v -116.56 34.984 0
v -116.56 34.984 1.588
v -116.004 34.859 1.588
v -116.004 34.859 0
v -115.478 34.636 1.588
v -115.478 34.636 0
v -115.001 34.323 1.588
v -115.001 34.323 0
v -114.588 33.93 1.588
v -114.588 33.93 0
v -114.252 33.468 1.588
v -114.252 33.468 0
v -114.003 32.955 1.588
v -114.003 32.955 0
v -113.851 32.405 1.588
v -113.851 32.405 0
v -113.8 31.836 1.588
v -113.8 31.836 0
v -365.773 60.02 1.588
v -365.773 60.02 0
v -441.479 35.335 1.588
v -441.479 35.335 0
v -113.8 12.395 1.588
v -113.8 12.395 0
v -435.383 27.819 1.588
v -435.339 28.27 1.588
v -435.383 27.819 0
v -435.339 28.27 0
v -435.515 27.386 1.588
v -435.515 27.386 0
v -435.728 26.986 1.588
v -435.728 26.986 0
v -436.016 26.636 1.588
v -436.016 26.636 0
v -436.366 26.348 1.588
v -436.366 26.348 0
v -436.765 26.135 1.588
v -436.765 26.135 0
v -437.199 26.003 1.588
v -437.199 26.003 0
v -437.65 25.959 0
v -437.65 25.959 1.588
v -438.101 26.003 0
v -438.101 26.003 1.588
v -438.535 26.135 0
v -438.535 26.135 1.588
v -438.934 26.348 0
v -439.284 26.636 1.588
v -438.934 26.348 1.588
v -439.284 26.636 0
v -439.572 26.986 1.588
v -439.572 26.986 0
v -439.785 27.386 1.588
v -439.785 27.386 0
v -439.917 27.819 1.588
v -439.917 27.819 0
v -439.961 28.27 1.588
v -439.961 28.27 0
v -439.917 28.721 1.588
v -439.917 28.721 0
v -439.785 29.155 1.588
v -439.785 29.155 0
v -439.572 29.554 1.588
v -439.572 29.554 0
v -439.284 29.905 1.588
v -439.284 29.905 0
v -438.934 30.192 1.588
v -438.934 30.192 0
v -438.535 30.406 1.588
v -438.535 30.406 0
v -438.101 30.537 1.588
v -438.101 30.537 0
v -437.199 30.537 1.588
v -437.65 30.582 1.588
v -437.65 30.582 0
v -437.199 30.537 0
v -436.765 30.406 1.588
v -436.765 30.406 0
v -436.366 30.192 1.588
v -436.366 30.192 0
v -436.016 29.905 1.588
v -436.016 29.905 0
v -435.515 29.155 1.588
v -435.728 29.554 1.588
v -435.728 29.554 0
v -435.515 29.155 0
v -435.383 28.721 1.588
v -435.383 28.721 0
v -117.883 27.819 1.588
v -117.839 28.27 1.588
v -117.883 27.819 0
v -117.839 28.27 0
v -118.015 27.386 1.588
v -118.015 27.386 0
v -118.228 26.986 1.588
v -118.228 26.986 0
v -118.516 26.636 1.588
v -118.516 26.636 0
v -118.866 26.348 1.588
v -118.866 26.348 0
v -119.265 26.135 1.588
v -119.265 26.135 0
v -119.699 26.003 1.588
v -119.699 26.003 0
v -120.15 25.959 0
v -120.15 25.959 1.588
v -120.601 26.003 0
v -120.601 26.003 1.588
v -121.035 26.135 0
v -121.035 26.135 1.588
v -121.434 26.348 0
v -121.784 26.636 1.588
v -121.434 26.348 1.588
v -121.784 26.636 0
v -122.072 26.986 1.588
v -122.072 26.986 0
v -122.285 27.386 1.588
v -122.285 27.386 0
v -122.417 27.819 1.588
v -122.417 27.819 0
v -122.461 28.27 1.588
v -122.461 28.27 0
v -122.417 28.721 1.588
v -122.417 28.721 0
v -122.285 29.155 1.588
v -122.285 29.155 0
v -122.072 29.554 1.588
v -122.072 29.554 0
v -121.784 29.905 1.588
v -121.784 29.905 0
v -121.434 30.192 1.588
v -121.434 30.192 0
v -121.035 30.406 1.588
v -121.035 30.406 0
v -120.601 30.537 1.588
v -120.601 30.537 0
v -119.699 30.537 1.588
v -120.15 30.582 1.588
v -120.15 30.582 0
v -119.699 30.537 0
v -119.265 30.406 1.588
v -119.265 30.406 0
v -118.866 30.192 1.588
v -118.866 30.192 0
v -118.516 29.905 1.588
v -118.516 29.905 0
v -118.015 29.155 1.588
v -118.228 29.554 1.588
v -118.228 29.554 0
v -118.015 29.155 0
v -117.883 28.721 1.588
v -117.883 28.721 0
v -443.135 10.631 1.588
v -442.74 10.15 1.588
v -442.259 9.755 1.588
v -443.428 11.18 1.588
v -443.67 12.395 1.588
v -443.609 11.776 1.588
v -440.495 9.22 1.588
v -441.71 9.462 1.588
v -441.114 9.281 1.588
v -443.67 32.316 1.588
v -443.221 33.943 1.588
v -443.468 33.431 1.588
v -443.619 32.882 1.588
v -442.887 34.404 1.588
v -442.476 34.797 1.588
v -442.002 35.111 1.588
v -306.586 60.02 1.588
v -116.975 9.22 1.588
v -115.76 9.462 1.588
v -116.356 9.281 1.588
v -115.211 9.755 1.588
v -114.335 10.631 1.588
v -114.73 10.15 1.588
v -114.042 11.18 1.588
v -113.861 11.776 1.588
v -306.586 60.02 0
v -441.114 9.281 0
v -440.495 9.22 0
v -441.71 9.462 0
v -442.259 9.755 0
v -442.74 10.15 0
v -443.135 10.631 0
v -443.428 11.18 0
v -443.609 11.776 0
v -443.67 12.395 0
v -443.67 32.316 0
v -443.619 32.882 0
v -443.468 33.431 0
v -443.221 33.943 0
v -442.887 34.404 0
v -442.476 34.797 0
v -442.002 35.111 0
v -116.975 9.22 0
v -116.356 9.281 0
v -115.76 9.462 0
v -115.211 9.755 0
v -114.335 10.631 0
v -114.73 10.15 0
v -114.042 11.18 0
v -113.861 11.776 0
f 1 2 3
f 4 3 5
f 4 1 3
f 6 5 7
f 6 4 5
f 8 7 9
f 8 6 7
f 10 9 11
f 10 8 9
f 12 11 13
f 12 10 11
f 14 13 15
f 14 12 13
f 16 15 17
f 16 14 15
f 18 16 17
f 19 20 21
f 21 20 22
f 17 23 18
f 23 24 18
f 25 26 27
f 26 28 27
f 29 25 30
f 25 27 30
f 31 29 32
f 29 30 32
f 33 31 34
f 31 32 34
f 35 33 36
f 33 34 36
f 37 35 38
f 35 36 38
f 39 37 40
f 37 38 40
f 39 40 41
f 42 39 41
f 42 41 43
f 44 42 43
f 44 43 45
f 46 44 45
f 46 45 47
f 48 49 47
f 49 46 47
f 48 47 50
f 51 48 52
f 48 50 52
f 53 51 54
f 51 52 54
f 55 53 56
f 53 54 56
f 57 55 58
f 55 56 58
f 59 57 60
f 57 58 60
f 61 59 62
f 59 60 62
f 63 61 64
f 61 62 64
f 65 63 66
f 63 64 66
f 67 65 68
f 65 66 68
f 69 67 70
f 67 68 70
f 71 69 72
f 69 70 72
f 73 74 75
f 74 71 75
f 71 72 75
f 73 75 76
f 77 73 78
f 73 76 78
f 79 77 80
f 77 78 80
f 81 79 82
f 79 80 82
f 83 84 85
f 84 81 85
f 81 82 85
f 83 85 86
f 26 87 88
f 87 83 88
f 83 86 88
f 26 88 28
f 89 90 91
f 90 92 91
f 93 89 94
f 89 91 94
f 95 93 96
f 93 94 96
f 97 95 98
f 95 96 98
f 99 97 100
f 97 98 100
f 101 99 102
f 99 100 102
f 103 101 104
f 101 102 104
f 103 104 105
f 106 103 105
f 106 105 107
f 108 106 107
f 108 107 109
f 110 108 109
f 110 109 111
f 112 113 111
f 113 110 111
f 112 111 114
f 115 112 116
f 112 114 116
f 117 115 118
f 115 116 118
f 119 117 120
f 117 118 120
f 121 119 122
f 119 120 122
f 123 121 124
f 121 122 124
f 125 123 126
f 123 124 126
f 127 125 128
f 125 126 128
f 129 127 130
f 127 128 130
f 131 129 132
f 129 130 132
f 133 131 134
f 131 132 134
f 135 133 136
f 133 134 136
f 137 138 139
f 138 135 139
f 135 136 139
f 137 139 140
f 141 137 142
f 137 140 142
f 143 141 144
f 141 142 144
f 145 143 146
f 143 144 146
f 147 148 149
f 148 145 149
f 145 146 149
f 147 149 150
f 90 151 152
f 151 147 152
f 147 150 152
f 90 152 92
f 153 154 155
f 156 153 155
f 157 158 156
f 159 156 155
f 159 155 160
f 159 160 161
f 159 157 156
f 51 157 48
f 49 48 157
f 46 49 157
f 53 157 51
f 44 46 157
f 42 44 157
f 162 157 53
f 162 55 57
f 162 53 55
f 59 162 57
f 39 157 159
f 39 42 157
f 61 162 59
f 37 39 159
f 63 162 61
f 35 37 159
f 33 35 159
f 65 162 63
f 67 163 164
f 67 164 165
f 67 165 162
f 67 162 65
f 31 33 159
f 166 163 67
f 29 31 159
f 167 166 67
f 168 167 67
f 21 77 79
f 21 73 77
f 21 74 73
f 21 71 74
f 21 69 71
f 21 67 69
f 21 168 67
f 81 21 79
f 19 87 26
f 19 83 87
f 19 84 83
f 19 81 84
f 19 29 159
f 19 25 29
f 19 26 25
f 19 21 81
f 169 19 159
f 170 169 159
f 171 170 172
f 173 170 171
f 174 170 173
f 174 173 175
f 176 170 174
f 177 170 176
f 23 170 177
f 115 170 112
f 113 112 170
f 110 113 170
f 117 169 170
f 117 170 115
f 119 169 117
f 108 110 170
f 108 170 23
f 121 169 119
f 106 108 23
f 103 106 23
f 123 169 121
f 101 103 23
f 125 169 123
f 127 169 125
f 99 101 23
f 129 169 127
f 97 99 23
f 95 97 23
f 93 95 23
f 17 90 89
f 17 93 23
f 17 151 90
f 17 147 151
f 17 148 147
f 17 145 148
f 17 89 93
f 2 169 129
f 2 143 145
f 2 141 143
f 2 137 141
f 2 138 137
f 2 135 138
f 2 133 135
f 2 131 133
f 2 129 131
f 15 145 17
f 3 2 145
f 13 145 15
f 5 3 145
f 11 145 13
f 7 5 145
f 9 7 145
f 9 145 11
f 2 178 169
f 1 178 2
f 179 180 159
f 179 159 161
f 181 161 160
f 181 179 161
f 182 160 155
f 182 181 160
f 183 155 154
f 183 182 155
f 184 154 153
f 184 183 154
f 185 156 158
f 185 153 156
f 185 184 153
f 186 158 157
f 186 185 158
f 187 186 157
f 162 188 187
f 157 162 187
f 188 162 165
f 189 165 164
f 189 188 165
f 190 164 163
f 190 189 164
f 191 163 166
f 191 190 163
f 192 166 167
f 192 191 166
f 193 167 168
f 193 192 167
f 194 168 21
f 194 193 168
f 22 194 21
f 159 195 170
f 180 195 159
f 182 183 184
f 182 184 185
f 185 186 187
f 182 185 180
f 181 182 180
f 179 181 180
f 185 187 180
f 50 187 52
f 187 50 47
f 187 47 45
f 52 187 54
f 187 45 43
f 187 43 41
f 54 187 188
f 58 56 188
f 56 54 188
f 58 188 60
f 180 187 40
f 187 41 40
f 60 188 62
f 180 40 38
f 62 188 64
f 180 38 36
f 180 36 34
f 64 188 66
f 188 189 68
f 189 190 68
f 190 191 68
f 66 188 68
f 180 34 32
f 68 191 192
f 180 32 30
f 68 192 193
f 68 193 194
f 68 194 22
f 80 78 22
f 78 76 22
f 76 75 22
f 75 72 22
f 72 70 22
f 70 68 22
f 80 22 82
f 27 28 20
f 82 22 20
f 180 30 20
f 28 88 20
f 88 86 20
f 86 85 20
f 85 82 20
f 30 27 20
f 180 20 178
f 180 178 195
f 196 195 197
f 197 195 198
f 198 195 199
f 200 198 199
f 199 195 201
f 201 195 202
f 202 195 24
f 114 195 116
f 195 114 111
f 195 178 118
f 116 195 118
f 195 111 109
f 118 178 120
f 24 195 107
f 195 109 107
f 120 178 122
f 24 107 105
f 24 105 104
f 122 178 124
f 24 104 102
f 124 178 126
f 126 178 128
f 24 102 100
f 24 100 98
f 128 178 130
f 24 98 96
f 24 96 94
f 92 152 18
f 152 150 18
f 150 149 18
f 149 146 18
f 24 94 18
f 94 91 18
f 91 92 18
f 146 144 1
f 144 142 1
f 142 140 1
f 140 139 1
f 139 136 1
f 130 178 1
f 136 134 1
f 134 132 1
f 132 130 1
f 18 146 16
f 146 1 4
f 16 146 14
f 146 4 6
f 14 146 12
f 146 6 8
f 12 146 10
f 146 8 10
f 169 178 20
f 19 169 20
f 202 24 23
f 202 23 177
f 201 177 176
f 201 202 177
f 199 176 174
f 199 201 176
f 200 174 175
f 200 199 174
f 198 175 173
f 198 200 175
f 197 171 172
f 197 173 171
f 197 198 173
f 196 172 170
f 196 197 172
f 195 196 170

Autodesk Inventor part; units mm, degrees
ref_plane "YZ Plane" through (0, 0, 0) normal (1, 0, 0) x (0, 1, 0)
ref_plane "XZ Plane" through (0, 0, 0) normal (0, 1, 0) x (-1, 0, 0)
ref_plane "XY Plane" through (0, 0, 0) normal (0, 0, 1) x (1, 0, 0)
sketch "Sketch1" plane through (0, 0, 0) normal (0, 0, 1) x (1, 0, 0)
  circle A0 centre (-120.15, 28.2703) radius 2.3114 projected
  circle A1 centre (-437.65, 28.2703) radius 2.3114 projected
  line L0 (-124.0119, 9.2203) -> (-113.8, 9.2203) projected
  line L1 (-113.8, 24.2317) -> (-113.8, 32.2073) projected
  line L2 (-443.67, 33.8077) -> (-443.67, 0.5333) projected
  line L3 (-382.9881, 34.6203) -> (-441.5119, 34.6203) projected
  line L4 (-443.67, 34.6203) -> (-113.8, 34.6203)
  line L5 (-113.8, 31.8362) -> (-113.8, 12.3953)
  line L6 (-116.975, 9.2203) -> (-440.495, 9.2203)
  line L7 (-443.67, 12.3953) -> (-443.67, 32.316)
  arc A2 (-116.975, 9.2203) -> (-113.8, 12.3953) centre (-116.975, 12.3953) ccw
  circle A3 centre (-361.45, 54.8387) radius 2.3114 projected
  line L8 (-306.586, 60.0203) -> (-365.773, 60.0203) projected
  line L9 (-365.773, 60.0203) -> (-441.4793, 35.3346)
  line L10 (-306.586, 60.0203) -> (-116.5603, 34.984)
  arc A4 (-443.67, 12.3953) -> (-440.495, 9.2203) centre (-440.495, 12.3953) ccw
  arc A5 (-441.4793, 35.3346) -> (-443.67, 32.316) centre (-440.495, 32.316) ccw
  arc A6 (-113.8, 31.8362) -> (-116.5603, 34.984) centre (-116.975, 31.8362) ccw
  line L11 (-306.586, 60.0203) -> (-365.773, 60.0203)
  point P0 (0, 0)
  dimension "d0" = 3.175
  dimension "d1" = 3.175
extrude "Extrusion1" add sketch "Sketch1" along normal blind 1.5875
sketch "Sketch2" plane through (0, 0, 1.5875) normal (0, 0, 1) x (1, 0, 0)
  circle A0 centre (-361.45, 54.8387) radius 2.3114 projected
  circle A1 centre (-361.45, 54.8387) radius 2.3114
  point P0 (0, 0)
extrude "Extrusion2" add sketch "Sketch2" against normal blind 1.5875
properties part number "panel"
